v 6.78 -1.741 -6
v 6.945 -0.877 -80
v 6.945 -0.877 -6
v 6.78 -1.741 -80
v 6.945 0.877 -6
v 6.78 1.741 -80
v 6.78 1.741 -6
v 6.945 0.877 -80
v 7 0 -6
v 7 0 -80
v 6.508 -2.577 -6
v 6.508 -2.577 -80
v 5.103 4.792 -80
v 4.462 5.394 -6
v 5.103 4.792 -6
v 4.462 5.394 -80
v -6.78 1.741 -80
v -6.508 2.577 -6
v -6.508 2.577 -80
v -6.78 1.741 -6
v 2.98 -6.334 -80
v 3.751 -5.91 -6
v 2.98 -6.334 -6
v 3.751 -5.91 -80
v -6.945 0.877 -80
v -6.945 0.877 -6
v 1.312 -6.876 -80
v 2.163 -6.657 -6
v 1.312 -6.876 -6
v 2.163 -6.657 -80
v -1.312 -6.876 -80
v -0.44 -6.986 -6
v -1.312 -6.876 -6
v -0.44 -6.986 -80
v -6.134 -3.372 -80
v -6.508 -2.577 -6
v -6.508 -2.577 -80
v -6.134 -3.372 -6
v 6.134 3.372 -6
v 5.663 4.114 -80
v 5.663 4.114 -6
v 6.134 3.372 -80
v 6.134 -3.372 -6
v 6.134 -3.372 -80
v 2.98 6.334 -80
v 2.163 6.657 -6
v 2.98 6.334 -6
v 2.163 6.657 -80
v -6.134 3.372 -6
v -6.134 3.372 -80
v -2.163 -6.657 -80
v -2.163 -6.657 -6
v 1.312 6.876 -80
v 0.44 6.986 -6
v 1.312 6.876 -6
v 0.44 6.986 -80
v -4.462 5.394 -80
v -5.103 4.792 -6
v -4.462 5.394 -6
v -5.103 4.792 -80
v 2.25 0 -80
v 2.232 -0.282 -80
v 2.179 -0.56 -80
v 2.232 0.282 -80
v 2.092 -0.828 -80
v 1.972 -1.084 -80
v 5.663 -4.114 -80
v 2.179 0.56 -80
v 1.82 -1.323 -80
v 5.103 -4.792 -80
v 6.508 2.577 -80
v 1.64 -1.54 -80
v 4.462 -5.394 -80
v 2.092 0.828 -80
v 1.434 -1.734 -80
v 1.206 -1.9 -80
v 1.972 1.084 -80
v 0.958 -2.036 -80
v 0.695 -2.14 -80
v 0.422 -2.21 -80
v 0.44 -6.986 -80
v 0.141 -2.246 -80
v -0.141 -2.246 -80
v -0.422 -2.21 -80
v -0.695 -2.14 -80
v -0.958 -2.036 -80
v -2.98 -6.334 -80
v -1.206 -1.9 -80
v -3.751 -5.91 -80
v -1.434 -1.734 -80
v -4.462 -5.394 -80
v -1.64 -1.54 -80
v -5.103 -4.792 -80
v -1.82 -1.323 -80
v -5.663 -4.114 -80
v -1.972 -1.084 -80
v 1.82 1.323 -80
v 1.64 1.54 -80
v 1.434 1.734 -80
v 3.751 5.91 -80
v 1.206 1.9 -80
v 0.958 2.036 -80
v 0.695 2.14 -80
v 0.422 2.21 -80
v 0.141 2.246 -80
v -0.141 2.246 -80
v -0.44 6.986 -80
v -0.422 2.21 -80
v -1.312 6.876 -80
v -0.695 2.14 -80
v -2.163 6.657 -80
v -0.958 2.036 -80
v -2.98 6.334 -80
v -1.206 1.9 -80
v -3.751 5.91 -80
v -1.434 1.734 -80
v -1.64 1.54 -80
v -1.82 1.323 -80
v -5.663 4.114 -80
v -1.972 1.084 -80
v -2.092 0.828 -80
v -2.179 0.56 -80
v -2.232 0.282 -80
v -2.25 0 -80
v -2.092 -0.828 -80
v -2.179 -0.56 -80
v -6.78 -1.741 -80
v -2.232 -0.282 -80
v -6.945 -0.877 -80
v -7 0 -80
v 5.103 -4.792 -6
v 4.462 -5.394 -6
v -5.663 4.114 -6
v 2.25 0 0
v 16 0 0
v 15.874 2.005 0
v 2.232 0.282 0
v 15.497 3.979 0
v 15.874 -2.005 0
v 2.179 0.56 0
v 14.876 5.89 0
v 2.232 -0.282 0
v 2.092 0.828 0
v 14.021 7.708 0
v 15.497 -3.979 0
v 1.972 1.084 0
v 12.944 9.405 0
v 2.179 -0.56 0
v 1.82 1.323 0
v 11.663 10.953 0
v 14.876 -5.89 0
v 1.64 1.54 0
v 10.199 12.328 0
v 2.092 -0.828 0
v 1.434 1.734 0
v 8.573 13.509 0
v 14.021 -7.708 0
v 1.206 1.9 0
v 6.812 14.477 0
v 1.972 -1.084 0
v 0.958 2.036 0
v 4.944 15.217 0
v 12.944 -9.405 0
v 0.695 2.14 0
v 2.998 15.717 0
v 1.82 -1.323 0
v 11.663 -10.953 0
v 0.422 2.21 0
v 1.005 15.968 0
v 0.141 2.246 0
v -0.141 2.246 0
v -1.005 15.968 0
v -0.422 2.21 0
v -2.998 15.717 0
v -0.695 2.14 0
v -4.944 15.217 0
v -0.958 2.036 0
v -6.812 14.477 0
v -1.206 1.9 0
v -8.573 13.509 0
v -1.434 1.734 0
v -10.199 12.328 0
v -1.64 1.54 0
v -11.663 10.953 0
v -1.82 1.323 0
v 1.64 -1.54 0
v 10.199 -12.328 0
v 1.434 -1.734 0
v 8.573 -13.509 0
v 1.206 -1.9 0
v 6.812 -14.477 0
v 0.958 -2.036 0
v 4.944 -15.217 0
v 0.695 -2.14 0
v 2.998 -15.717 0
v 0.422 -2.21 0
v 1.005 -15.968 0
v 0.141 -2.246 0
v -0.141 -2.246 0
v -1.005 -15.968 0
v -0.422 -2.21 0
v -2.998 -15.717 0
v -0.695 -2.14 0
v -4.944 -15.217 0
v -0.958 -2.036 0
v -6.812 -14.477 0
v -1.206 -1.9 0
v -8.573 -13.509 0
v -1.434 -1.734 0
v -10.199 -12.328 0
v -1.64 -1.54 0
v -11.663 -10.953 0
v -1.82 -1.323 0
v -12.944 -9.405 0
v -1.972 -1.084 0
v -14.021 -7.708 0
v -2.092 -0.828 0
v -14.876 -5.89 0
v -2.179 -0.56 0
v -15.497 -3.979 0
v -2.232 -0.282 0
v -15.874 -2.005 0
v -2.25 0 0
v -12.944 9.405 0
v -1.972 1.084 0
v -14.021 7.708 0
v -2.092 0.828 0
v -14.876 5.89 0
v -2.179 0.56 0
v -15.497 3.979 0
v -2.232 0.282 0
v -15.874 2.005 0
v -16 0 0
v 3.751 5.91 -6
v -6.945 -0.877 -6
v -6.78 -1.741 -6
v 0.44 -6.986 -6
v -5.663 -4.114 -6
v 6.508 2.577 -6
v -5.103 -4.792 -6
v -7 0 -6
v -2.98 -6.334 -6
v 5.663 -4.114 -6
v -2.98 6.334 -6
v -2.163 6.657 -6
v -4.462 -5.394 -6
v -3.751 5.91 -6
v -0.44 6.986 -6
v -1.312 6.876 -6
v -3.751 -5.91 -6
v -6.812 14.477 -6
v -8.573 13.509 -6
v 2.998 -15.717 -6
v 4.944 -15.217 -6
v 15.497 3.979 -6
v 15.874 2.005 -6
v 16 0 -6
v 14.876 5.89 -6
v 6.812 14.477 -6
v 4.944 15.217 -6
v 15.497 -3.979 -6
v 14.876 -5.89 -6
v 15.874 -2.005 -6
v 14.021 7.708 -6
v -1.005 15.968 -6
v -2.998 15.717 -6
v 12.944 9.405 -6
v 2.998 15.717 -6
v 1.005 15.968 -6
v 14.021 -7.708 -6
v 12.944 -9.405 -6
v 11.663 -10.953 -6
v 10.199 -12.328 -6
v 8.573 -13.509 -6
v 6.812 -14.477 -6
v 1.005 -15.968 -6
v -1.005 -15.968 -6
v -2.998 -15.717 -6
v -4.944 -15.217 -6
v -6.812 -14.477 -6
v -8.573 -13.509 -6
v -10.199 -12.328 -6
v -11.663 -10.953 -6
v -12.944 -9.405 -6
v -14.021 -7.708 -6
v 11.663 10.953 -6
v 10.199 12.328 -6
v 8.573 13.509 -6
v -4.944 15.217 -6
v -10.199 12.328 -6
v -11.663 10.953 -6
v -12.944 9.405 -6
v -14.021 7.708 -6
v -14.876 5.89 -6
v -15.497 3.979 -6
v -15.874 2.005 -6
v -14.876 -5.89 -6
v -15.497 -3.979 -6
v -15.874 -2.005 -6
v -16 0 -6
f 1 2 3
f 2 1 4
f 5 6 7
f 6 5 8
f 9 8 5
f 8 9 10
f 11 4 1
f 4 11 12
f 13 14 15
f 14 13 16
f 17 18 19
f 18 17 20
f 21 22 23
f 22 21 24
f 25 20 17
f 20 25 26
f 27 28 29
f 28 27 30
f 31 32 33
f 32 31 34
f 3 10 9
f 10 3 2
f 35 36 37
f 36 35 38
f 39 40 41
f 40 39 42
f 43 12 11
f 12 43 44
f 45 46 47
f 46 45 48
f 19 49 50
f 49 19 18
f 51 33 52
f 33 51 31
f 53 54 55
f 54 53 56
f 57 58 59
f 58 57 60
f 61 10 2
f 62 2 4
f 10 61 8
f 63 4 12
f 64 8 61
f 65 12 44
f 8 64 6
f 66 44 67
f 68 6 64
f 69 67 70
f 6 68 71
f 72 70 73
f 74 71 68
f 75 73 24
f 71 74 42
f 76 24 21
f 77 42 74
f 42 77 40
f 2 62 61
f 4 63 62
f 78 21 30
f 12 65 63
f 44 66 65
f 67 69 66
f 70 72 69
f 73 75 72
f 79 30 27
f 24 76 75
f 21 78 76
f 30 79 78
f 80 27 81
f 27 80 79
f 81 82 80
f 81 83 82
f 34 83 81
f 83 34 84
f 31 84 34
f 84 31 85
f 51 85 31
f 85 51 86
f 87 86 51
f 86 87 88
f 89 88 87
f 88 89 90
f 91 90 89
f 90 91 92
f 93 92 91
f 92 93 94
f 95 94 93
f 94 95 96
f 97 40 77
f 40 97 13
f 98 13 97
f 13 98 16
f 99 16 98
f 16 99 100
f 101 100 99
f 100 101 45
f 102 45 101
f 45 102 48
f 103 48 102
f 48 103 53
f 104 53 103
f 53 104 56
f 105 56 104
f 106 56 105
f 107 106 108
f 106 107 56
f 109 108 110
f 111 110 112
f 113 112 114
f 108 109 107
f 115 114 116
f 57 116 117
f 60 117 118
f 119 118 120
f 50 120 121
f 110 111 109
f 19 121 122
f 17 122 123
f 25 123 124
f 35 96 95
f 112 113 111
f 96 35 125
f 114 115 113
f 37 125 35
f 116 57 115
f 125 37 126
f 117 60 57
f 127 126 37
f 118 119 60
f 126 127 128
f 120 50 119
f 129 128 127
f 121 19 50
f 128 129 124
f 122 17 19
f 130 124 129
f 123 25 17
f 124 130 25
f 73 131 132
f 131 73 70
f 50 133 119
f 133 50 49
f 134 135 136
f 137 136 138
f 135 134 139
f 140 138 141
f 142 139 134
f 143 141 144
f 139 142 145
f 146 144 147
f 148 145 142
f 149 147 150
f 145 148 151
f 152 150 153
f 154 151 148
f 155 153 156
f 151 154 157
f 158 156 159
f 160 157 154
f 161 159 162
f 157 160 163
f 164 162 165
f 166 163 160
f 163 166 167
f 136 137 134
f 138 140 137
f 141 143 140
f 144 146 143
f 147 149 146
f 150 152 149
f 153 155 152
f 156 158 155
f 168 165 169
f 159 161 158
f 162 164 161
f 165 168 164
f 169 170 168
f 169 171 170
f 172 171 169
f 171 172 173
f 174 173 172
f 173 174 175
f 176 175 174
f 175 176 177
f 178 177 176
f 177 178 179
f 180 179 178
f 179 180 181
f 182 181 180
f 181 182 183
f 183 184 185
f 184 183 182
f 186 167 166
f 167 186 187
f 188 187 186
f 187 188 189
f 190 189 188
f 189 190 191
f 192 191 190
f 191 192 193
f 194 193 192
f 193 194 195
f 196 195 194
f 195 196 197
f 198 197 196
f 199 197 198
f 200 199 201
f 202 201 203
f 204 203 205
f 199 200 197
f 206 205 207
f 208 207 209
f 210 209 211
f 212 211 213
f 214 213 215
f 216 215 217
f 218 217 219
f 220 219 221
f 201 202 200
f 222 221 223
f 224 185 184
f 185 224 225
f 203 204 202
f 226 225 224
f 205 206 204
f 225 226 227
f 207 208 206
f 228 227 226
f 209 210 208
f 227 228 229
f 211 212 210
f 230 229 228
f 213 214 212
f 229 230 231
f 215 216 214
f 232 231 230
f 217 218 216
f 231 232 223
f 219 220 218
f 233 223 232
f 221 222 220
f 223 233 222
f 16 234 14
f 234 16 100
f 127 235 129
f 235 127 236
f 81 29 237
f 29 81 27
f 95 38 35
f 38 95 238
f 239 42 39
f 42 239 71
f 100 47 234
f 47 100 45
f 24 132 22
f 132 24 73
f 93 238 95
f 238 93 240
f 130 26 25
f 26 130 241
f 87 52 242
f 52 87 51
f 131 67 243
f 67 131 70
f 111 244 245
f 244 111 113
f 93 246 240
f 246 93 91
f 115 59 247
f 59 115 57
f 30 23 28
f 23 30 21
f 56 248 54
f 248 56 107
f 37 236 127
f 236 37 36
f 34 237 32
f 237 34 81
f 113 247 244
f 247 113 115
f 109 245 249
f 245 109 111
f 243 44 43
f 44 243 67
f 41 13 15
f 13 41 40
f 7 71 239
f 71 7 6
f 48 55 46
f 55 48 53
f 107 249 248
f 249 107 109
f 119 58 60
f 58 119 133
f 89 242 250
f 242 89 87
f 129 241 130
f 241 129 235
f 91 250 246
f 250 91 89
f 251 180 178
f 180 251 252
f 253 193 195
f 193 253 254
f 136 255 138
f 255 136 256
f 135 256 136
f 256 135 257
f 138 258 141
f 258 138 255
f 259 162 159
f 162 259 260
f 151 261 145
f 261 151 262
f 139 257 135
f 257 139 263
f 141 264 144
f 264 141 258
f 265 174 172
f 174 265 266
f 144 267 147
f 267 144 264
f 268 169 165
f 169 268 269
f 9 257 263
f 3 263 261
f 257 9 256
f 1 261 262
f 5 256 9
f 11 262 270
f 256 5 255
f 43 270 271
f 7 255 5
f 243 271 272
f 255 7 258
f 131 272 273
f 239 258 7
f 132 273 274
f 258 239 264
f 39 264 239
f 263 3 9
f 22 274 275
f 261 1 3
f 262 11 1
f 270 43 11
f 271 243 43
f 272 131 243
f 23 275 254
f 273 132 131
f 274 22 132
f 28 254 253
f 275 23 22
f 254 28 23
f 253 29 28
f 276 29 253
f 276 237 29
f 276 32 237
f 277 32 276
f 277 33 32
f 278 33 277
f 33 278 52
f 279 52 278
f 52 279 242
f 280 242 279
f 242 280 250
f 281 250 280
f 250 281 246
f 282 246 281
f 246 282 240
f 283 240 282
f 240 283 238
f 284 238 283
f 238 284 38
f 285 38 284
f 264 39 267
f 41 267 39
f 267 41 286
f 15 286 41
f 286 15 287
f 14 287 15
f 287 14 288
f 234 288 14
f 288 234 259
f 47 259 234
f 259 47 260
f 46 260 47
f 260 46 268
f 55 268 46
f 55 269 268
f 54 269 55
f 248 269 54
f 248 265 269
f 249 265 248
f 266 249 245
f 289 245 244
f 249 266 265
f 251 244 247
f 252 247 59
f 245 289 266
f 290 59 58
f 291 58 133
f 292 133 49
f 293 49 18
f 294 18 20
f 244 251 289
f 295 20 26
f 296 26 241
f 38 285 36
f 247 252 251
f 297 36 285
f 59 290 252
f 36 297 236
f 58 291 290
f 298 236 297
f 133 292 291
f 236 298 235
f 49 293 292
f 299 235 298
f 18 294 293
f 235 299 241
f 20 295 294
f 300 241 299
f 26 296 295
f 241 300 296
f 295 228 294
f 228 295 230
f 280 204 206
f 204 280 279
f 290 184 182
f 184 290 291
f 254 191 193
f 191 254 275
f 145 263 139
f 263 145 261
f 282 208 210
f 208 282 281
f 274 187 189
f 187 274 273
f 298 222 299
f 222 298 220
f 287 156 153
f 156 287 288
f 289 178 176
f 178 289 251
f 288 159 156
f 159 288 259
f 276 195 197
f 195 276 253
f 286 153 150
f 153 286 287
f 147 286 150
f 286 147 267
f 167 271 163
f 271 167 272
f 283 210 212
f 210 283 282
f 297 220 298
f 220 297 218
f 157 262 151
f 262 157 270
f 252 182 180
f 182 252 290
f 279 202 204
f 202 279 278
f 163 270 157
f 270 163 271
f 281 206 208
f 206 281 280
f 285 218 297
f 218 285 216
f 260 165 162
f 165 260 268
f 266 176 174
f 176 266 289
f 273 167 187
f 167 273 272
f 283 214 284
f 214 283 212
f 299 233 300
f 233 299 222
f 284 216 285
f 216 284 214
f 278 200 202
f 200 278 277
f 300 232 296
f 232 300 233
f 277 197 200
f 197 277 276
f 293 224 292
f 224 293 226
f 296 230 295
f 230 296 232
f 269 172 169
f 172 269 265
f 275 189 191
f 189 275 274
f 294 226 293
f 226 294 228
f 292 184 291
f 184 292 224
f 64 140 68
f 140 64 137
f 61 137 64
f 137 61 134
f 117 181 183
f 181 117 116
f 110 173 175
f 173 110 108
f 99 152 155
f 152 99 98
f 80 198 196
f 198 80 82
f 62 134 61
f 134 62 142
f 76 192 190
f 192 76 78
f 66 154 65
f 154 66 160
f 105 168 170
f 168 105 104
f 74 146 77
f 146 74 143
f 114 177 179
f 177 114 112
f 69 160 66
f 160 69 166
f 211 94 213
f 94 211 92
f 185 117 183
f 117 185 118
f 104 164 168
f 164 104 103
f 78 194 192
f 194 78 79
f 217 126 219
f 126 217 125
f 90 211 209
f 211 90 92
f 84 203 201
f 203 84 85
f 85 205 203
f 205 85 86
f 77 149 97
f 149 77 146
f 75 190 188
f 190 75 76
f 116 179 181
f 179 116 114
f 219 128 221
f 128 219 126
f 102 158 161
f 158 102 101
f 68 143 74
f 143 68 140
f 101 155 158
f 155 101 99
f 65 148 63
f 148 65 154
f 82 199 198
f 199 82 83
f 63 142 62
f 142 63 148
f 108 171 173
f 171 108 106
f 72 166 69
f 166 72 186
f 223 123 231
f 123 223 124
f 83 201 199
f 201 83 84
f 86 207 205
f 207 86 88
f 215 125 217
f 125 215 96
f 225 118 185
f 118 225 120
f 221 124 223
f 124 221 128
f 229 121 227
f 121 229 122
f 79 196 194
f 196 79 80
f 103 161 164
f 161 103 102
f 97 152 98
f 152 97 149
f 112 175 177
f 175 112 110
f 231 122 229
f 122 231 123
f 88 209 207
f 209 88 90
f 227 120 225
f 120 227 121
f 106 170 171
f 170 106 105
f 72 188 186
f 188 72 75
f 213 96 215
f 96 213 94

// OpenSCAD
$fn = 50;


difference() {
	union() {
		translate(v = [0, 0, -80.0000000000]) {
			cylinder(h = 80, r = 7.0000000000);
		}
		translate(v = [0, 0, -6.0000000000]) {
			cylinder(h = 6, r = 16.0000000000);
		}
	}
	union() {
		#translate(v = [0, 0, -80]) {
			cylinder(h = 80, r = 2.2500000000);
		}
	}
}
